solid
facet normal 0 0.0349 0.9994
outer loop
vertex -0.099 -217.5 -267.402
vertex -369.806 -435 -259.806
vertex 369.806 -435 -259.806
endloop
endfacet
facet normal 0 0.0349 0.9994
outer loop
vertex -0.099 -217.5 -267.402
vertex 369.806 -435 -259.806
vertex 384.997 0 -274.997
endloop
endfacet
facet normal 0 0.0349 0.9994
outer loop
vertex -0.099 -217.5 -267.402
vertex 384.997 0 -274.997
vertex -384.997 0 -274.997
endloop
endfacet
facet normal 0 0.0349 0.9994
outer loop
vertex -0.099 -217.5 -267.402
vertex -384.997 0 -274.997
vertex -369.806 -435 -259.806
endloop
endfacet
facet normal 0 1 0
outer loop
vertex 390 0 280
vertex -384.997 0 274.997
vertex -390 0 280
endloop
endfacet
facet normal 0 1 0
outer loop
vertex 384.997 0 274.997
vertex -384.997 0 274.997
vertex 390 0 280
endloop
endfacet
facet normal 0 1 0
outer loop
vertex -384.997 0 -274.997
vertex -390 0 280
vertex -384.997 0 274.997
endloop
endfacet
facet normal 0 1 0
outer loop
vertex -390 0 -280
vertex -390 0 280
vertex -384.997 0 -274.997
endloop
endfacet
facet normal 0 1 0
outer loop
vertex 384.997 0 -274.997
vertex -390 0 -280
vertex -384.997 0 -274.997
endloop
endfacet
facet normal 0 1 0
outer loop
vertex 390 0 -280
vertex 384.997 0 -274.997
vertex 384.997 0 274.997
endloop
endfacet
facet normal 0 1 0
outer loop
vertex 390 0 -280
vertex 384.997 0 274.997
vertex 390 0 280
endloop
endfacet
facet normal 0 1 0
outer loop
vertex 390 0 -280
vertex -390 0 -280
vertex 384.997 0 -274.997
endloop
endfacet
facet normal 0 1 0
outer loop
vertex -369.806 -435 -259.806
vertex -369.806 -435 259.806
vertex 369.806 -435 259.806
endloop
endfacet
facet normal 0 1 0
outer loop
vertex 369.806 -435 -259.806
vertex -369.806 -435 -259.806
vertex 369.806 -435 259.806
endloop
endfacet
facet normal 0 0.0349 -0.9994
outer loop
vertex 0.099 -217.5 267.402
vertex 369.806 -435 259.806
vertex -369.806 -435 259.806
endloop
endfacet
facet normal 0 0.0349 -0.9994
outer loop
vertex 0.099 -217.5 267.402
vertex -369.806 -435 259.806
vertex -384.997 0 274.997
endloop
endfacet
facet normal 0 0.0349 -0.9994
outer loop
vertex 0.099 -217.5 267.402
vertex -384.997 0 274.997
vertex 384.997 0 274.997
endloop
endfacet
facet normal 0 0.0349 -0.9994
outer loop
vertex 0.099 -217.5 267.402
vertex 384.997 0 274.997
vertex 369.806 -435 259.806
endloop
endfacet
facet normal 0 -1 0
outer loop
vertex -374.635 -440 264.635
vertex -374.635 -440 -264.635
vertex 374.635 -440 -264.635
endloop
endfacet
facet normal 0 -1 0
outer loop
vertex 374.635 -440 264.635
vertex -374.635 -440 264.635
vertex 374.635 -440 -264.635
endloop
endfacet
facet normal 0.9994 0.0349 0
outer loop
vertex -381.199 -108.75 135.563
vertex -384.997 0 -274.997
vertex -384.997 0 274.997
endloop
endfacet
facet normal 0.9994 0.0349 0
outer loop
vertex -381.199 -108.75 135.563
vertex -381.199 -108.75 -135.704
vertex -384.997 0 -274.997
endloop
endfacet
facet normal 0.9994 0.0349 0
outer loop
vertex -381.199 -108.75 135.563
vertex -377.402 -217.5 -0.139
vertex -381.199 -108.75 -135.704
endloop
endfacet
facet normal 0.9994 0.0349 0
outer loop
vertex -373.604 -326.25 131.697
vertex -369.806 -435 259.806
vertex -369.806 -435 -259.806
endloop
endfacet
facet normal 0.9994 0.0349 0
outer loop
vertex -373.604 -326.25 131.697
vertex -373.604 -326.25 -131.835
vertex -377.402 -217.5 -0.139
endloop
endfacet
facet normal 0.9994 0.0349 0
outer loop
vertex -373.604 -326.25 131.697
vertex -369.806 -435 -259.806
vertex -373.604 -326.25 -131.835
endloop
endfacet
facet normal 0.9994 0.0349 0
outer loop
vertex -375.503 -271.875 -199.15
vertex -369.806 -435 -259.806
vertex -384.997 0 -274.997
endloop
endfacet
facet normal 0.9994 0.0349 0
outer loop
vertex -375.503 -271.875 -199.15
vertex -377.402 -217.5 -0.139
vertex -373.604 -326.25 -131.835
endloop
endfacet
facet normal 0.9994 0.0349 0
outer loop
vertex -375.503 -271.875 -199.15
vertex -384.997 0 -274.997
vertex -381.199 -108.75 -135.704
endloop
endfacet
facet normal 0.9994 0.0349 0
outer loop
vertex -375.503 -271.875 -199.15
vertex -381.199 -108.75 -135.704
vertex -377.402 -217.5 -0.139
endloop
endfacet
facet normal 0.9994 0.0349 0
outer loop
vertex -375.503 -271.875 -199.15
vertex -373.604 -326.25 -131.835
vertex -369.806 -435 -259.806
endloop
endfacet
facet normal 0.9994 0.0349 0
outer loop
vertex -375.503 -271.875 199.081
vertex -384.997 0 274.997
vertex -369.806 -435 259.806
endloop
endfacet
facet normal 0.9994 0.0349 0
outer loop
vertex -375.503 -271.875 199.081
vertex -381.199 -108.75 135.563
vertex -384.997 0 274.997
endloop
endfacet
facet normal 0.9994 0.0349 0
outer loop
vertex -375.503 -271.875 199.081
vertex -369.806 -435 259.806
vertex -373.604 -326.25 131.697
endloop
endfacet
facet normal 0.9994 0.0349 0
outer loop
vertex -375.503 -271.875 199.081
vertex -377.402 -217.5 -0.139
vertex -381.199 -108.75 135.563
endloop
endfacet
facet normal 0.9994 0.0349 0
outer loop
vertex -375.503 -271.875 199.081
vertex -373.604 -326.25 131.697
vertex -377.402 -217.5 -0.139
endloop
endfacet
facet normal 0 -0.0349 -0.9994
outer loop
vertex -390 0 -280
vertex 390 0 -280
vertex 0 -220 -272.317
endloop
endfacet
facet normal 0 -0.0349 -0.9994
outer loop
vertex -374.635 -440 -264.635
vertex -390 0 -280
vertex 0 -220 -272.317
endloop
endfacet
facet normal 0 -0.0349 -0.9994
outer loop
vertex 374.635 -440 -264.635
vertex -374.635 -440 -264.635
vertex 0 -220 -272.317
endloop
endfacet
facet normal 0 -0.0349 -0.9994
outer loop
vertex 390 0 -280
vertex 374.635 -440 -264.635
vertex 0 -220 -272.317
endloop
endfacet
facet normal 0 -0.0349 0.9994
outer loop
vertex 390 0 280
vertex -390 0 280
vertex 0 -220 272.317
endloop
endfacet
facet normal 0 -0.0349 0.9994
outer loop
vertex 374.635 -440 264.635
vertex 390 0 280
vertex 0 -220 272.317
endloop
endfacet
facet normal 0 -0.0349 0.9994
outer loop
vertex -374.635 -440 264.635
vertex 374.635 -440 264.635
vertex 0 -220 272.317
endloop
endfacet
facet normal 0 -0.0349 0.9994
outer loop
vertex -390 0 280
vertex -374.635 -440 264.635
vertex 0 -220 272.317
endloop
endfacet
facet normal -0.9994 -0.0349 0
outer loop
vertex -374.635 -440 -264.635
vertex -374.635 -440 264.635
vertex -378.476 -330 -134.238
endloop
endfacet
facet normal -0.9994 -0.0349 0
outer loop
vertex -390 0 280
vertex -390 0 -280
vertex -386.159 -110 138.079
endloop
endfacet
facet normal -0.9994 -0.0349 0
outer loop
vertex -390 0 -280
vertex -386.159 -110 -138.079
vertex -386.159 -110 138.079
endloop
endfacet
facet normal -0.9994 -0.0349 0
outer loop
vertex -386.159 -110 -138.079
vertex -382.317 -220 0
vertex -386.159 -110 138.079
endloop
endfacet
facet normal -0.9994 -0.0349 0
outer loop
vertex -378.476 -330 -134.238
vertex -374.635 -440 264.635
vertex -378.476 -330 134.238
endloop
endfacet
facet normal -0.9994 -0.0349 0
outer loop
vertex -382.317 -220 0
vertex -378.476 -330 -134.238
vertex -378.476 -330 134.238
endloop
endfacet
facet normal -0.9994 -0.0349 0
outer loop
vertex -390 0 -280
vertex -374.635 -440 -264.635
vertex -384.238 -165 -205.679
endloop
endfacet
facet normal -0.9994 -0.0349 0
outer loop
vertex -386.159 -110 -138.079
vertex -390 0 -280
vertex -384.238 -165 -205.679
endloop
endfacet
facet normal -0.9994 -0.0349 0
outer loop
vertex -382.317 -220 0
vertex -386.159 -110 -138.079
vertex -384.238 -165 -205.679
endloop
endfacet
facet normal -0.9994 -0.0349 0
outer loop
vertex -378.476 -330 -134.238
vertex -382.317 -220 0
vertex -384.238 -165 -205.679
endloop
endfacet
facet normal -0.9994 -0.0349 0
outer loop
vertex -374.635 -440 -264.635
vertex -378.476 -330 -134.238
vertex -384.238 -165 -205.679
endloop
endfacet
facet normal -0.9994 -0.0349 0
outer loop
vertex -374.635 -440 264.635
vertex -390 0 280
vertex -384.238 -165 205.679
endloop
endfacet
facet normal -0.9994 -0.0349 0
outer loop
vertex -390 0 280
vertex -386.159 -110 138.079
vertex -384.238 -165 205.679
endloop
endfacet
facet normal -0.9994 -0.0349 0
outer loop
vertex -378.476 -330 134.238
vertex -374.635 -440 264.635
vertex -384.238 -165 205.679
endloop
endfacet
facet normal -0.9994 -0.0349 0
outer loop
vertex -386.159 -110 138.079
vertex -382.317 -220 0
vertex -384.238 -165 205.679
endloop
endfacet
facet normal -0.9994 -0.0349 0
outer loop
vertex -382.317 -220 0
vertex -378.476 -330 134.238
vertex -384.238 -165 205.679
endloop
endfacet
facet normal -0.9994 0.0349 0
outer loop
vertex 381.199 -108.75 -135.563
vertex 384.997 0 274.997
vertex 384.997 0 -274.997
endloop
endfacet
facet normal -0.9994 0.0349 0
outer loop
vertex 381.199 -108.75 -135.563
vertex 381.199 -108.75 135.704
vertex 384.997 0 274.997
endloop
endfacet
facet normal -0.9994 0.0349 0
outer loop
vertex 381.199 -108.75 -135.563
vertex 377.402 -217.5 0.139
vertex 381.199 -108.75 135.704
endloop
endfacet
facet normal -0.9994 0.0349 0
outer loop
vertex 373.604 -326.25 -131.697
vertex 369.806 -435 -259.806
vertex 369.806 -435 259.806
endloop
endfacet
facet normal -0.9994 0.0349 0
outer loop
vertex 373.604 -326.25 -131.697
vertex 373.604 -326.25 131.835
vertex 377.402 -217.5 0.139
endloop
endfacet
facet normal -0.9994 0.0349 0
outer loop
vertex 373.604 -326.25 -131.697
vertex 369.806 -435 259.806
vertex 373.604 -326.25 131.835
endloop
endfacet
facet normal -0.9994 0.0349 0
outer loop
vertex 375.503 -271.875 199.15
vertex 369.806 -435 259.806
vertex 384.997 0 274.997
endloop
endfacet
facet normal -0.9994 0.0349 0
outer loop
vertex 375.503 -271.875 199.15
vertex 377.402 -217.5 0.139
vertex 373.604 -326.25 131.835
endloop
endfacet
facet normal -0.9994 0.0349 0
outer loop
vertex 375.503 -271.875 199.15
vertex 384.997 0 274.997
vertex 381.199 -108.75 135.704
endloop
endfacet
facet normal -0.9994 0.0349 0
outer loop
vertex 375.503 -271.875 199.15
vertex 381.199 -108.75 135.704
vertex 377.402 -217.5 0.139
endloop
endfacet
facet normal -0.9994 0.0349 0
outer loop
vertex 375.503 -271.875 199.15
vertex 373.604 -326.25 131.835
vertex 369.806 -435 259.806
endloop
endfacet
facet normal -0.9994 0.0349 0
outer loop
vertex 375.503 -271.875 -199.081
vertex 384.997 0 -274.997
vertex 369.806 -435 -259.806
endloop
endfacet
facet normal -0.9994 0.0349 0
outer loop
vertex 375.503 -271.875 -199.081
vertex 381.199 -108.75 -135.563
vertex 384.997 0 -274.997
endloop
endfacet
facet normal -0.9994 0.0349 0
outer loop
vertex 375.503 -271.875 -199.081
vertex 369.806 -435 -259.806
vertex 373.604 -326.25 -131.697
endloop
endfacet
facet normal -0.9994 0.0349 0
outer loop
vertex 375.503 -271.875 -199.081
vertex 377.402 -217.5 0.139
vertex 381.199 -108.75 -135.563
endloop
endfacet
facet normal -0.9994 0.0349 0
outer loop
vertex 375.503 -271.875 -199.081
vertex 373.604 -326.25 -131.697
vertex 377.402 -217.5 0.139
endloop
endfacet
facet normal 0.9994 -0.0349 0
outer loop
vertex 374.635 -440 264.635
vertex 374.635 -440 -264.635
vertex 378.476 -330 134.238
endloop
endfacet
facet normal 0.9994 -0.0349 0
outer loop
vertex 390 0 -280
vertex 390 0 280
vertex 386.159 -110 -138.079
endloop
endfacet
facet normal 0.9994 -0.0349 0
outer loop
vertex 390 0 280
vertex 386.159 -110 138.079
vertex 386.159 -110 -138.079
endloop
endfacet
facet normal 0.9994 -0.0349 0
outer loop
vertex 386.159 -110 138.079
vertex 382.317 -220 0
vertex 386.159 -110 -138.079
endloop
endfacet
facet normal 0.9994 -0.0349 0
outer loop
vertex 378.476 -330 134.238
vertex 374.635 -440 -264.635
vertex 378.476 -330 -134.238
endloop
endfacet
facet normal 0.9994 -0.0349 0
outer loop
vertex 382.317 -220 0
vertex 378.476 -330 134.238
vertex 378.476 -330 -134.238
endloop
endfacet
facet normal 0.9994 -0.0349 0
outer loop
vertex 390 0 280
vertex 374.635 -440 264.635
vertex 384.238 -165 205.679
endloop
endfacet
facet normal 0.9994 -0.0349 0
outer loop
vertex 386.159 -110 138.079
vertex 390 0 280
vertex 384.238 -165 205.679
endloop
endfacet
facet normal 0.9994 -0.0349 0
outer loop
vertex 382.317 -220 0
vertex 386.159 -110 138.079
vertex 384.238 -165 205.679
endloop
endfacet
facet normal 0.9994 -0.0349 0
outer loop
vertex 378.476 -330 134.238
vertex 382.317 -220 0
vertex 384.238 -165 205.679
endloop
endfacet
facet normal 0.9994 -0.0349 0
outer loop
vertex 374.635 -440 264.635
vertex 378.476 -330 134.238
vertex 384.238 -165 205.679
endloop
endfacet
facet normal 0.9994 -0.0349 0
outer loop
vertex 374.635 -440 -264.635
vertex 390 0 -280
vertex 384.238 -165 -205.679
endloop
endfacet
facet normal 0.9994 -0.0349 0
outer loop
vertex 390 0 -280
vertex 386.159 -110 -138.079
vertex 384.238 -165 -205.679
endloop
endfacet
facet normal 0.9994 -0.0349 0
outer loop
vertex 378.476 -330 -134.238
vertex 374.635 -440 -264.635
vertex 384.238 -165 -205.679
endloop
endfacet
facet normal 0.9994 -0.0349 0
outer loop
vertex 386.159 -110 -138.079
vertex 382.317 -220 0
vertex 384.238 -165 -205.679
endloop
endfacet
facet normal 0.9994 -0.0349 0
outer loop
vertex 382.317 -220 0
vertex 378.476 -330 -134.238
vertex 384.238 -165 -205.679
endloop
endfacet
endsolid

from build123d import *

# Parameters (mm, degrees)
SKETCH1_W      = 780
SKETCH1_H      = 560
EXTRUDE1_DEPTH = 440
EXTRUDE1_TAPER = 2
SHELL1_T       = -5


with BuildPart() as part:
    # Sketch1 → Extrude1 (new body)
    with BuildSketch(Plane(origin=(0, 0, 0), x_dir=(1, 0, 0), z_dir=(0, 1, 0))):
        Rectangle(SKETCH1_W, SKETCH1_H)
    extrude(amount=-EXTRUDE1_DEPTH, taper=EXTRUDE1_TAPER)

    # Shell1
    shell1_openings = [part.faces().sort_by_distance(p)[0] for p in [
        (0, 0, 0),
    ]]
    offset(amount=SHELL1_T, openings=shell1_openings, kind=Kind.INTERSECTION)


solid = part.part
